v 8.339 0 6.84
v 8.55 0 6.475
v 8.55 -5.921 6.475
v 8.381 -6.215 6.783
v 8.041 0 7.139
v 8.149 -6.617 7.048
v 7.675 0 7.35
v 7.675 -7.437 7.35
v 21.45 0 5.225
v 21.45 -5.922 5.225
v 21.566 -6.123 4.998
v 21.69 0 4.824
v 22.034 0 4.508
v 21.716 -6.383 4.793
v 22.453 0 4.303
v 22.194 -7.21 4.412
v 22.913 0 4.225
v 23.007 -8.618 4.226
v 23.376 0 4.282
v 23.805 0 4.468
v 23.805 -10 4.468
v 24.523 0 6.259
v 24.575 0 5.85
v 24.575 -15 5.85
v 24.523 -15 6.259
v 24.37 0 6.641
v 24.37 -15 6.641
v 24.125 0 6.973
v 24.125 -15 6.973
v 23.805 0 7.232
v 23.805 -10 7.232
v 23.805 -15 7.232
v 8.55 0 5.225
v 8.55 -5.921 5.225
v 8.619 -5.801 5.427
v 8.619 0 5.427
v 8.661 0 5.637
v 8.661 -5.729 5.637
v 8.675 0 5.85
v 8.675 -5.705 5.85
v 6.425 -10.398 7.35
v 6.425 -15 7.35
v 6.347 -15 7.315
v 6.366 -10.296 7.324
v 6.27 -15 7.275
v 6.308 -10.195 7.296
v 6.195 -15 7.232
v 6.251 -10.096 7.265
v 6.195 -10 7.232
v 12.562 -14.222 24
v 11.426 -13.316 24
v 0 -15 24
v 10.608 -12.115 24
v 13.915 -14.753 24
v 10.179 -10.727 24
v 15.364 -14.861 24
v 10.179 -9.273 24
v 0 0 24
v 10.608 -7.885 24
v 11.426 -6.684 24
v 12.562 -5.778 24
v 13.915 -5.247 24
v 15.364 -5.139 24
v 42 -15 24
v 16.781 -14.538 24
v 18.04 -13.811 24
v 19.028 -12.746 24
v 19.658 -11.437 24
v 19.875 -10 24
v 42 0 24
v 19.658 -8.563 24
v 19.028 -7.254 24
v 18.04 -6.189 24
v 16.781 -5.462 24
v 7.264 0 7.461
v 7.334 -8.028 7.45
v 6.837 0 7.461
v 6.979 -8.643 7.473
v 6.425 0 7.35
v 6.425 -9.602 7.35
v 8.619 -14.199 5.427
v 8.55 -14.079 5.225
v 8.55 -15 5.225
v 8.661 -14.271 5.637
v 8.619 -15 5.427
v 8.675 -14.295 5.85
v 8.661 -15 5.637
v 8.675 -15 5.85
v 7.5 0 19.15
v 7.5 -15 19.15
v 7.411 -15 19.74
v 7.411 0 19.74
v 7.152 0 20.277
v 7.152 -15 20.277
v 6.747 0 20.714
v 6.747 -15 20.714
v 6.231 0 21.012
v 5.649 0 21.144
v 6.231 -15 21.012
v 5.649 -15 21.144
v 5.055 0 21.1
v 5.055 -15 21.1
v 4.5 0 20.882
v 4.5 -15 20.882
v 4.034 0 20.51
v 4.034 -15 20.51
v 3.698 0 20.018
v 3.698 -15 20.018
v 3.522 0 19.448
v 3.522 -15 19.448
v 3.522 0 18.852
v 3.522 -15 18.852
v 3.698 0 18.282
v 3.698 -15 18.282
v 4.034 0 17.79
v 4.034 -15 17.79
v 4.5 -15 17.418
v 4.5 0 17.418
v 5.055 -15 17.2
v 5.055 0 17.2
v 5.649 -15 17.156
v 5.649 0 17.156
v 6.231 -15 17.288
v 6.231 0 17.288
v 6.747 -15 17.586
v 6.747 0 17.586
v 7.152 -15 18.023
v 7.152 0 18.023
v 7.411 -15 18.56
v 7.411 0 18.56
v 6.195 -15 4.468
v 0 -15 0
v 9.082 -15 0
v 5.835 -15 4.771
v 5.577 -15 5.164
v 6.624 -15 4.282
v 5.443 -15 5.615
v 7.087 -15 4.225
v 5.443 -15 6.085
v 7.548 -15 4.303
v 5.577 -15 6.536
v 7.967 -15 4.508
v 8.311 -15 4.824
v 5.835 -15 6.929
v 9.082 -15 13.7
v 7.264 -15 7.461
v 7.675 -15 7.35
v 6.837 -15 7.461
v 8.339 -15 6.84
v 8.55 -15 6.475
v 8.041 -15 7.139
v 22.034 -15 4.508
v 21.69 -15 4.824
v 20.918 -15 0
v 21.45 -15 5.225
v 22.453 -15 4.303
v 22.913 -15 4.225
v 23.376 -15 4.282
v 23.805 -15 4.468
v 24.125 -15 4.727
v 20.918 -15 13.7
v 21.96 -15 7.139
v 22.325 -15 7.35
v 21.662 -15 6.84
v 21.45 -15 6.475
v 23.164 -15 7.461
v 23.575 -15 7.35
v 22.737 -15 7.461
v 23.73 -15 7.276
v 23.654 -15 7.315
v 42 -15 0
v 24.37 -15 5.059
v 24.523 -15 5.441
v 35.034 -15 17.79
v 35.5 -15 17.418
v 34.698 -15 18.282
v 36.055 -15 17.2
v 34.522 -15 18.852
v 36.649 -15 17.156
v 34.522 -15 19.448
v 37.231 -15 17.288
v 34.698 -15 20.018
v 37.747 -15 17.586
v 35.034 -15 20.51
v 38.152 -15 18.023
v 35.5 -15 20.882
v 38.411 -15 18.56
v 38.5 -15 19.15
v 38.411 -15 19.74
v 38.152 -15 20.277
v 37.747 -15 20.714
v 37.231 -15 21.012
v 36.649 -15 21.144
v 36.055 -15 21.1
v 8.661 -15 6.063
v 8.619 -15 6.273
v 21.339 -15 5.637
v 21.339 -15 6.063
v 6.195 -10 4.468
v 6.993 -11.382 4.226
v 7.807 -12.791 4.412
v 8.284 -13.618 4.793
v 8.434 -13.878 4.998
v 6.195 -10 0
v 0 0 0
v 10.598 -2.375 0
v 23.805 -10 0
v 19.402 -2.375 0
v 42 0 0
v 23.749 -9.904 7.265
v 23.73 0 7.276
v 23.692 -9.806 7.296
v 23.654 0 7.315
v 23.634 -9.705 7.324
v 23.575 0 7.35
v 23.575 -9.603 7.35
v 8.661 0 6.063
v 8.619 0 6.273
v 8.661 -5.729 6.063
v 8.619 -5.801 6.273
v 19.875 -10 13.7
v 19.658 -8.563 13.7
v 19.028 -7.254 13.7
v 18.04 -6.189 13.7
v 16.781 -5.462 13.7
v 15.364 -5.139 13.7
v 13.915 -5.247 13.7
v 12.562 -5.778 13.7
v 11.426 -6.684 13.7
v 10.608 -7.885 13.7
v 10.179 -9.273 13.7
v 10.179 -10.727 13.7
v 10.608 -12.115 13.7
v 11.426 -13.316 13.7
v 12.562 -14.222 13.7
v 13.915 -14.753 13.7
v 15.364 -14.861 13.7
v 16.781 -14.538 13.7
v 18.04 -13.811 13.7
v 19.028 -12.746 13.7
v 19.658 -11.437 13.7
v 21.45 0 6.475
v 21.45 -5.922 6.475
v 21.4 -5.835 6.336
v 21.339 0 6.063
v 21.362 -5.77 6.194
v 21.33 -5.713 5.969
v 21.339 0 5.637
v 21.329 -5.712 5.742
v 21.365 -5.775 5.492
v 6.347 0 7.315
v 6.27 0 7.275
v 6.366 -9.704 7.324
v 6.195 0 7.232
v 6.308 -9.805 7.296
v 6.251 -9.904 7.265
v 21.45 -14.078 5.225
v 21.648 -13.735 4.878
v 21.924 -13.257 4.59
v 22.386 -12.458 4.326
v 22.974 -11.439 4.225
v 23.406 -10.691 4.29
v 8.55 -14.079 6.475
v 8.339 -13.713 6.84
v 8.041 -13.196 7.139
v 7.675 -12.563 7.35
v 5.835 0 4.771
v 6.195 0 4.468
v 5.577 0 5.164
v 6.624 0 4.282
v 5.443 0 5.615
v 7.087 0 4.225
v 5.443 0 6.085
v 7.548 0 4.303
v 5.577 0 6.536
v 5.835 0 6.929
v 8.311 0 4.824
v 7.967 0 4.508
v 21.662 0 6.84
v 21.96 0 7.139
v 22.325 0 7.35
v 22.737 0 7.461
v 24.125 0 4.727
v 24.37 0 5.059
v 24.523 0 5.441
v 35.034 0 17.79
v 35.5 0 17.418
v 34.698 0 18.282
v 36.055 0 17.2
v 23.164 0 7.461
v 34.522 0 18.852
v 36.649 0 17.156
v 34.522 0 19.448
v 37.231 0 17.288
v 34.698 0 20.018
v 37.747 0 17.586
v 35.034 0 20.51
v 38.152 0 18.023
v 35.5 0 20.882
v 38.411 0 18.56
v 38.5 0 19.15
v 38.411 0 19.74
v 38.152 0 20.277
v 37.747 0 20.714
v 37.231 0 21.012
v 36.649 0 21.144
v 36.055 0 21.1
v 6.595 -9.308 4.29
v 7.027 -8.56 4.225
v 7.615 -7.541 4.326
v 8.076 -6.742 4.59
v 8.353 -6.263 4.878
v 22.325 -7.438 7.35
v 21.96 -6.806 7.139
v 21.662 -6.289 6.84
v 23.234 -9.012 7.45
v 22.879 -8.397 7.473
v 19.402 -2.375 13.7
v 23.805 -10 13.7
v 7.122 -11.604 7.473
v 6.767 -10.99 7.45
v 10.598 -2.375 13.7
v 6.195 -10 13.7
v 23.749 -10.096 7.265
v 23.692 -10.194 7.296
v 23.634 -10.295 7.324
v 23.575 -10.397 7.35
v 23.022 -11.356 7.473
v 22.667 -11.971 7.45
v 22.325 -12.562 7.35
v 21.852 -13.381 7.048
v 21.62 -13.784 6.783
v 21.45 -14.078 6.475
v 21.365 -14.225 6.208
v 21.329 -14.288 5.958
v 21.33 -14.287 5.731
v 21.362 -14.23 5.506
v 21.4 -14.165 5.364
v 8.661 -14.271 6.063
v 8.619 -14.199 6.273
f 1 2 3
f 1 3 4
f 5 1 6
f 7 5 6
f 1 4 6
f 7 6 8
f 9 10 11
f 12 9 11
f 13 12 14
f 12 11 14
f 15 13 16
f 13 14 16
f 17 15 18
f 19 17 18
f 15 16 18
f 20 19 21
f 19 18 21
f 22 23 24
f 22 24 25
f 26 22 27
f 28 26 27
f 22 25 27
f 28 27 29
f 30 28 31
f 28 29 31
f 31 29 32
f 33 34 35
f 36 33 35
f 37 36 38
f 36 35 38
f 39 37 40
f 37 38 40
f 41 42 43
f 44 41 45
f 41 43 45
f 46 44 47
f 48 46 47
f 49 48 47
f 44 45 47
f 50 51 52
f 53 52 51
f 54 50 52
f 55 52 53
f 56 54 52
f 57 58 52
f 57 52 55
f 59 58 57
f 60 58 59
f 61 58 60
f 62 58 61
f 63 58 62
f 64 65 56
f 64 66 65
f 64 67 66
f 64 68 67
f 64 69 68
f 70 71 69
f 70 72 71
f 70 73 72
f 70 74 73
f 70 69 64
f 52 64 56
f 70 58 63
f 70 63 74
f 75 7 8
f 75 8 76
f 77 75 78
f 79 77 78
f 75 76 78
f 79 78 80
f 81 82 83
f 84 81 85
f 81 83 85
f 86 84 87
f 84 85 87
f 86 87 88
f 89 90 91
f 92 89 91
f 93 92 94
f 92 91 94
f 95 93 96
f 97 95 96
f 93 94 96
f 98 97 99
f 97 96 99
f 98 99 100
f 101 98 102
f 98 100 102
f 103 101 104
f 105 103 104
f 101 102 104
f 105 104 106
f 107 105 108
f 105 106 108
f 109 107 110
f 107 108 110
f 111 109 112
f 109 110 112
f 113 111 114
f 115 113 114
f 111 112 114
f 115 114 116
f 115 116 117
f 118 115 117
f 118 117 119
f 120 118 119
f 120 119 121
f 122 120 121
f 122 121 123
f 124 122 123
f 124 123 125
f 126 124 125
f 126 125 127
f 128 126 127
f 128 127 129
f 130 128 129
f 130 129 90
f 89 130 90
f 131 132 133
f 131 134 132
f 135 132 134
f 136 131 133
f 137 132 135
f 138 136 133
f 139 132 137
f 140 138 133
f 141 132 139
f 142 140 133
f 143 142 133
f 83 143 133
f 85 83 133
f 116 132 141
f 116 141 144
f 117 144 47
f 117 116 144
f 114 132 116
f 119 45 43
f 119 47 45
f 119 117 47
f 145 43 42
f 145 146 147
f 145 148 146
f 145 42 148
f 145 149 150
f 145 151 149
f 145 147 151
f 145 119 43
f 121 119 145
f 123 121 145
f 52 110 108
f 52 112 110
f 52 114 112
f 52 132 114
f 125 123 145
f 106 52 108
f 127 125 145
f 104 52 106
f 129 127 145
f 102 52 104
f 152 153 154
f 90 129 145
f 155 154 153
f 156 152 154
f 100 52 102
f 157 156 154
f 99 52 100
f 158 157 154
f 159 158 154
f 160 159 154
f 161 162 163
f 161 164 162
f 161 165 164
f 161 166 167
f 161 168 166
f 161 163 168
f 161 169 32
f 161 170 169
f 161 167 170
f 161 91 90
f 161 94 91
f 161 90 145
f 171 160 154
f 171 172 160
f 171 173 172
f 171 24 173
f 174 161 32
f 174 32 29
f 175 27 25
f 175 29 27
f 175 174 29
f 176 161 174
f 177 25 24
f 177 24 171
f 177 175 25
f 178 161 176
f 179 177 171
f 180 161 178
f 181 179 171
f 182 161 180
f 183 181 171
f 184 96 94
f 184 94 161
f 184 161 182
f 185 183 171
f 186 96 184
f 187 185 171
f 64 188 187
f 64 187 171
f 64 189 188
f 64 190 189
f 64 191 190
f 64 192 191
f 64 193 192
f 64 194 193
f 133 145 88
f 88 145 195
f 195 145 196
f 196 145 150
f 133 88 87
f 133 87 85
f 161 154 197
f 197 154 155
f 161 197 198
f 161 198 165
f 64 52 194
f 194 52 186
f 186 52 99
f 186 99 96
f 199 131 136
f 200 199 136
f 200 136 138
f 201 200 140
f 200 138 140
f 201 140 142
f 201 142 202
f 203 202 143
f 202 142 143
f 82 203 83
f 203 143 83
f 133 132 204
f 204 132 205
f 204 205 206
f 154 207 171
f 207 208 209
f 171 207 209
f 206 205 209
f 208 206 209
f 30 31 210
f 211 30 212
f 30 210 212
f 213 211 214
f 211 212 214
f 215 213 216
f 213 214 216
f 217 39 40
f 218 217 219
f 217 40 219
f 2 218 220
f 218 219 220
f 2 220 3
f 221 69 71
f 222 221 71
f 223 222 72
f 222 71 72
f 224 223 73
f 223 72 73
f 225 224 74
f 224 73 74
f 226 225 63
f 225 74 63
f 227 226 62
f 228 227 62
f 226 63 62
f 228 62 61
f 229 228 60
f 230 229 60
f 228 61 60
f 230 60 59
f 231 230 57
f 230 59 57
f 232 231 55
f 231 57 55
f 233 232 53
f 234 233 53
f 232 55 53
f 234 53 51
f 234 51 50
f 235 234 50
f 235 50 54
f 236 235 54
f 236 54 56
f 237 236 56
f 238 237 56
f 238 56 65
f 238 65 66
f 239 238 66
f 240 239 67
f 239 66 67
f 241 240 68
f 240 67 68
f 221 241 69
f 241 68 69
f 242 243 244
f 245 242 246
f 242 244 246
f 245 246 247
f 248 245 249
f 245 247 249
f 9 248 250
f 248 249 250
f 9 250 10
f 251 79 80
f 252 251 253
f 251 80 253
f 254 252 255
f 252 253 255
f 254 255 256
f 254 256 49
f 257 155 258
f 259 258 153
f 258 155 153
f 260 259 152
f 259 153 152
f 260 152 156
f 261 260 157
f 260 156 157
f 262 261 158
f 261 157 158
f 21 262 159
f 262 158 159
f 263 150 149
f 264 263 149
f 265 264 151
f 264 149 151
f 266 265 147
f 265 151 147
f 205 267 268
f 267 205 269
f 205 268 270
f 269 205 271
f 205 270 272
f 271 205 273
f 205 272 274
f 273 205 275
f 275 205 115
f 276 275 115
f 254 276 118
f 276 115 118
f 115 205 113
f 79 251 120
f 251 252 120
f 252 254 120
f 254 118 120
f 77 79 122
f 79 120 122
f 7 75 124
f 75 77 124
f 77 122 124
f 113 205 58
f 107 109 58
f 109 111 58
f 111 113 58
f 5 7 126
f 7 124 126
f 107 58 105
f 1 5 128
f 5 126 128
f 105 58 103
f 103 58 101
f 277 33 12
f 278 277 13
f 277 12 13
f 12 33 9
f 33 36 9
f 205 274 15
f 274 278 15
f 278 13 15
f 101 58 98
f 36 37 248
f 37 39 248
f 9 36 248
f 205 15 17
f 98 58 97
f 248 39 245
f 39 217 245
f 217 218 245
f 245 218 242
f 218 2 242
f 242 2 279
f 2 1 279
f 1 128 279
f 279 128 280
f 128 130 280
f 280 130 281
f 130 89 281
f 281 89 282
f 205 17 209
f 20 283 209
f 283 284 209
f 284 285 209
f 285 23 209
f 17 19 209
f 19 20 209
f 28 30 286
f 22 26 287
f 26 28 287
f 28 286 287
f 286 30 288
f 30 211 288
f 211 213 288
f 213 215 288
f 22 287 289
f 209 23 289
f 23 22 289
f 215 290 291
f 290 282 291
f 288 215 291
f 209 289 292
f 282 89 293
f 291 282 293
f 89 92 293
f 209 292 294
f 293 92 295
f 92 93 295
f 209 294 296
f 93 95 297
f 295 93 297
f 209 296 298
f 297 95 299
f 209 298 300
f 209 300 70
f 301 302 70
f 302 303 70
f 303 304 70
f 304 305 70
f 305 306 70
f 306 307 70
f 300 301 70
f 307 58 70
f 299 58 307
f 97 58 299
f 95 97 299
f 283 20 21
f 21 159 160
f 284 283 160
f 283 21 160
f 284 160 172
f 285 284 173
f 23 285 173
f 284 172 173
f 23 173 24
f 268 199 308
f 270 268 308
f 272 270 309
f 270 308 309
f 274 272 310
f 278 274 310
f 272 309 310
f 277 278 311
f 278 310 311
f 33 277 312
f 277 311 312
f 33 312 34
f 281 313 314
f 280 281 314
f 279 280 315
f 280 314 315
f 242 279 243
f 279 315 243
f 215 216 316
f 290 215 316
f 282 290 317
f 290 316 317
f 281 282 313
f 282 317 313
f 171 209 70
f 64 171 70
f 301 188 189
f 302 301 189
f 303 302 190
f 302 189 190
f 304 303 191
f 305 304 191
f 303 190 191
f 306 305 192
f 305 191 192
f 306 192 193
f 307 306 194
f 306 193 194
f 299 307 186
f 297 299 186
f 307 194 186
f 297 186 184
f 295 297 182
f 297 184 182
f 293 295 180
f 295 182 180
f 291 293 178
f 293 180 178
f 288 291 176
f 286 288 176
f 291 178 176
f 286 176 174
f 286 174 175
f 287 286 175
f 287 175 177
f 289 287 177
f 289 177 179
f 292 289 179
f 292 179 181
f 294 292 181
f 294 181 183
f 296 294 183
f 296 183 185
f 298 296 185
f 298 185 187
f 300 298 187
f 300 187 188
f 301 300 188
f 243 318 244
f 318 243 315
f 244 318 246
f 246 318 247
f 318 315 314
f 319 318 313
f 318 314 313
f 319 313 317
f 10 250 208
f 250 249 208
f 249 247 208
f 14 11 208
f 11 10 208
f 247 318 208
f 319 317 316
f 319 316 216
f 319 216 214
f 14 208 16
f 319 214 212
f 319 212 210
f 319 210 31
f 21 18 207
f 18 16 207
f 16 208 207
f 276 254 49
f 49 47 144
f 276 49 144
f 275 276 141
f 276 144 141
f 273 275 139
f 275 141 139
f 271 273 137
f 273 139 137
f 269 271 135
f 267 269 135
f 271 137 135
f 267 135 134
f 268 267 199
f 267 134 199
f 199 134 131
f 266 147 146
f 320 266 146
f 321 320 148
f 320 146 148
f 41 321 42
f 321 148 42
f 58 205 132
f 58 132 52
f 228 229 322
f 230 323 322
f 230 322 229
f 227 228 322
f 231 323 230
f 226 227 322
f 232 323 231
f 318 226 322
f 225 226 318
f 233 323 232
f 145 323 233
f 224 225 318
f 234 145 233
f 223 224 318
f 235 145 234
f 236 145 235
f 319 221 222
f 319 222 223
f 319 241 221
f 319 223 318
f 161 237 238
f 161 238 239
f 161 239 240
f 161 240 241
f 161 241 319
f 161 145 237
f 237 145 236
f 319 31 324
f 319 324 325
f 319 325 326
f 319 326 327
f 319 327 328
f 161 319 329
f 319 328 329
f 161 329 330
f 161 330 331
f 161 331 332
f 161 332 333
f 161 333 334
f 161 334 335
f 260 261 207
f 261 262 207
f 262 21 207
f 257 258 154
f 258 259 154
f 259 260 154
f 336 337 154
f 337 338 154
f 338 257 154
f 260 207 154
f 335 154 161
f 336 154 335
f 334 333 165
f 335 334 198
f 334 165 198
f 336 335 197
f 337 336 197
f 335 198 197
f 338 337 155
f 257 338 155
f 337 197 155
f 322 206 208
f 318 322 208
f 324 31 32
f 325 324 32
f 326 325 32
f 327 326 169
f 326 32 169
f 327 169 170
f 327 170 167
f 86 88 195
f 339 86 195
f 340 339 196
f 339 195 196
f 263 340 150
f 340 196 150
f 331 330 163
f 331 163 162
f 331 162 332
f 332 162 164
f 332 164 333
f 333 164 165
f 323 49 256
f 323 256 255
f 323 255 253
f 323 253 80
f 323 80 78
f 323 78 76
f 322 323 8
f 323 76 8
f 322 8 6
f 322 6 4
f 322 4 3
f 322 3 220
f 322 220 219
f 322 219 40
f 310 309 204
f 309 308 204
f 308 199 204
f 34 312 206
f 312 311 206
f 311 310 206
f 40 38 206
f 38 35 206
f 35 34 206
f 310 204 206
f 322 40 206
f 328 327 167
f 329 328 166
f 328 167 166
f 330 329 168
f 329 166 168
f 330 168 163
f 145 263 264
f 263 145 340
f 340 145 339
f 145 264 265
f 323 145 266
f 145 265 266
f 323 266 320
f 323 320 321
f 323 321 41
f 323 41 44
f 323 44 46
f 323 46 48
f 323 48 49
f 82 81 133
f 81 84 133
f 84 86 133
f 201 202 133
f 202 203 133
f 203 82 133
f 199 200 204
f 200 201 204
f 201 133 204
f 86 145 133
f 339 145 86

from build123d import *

# Parameters (mm, degrees)
F0_W     = 42
F0_H     = 24
F1_DEPTH = 15
F2_R     = 2
F3_DEPTH = 25
F4_R     = 4.875
F5_DEPTH = 10.3
F6_R     = 4.875
F7_DEPTH = 13.7
F9_DEPTH = 25


with BuildPart() as f1:
    # F0 (on Front) → F1 (new body)
    with BuildSketch(Plane.XZ):
        with Locations((21, 12)):
            Rectangle(F0_W, F0_H)
    extrude(amount=F1_DEPTH)

    # F2 (on face) → F3 (cut)
    with BuildSketch(Plane.XZ.offset(15)):
        with Locations((5.5, 19.15)):
            Circle(F2_R)
        with Locations((36.5, 19.15)):
            Circle(F2_R)
    extrude(amount=-F3_DEPTH, mode=Mode.SUBTRACT)

    # F4 (on face) → F5 (cut)
    with BuildSketch(Plane.XY.offset(24)):
        with Locations((15, -10)):
            Circle(F4_R)
    extrude(amount=-F5_DEPTH, mode=Mode.SUBTRACT)

    # F6 (on face) → F7 (cut, through all)
    with BuildSketch(Plane(origin=(0, 0, 0), x_dir=(1, 0, 0), z_dir=(0, 0, -1))):
        Polygon((20.9178402592, 15), (9.0821597408, 15), (6.1954083949, 10), (10.5977041974, 2.375), (19.4022958026, 2.375), (23.8045916051, 10), align=None)
        with Locations((15, 10)):
            Circle(F6_R, mode=Mode.SUBTRACT)
        with Locations((15, 10)):
            Circle(F6_R)
    extrude(amount=-F7_DEPTH, mode=Mode.SUBTRACT)

    # F8 (on face) → F9 (cut)
    with BuildSketch(Plane.XZ.offset(15)):
        with BuildLine():
            ThreePointArc((6.1954083949, 7.2318827736), (5.4254083949, 5.85), (6.1954083949, 4.4681172264))
            Line((6.1954083949, 4.4681172264), (6.1954083949, 7.2318827736))
        make_face()
        with BuildLine():
            ThreePointArc((8.5504083949, 6.475), (8.1994569143, 6.9990485194), (7.6754083949, 7.35))
            Line((7.6754083949, 7.35), (6.4254083949, 7.35))
            ThreePointArc((6.4254083949, 7.35), (6.3080554331, 7.2955231165), (6.1954083949, 7.2318827736))
            Line((6.1954083949, 7.2318827736), (6.1954083949, 4.4681172264))
            ThreePointArc((6.1954083949, 4.4681172264), (7.5476247796, 4.3029379887), (8.5504083949, 5.225))
            Line((8.5504083949, 5.225), (8.5504083949, 6.475))
        make_face()
        with BuildLine():
            Line((6.4254083949, 7.35), (7.6754083949, 7.35))
            ThreePointArc((7.6754083949, 7.35), (7.0504083949, 7.475), (6.4254083949, 7.35))
        make_face()
        with BuildLine():
            ThreePointArc((8.6754083949, 5.85), (8.6438519929, 6.1686887196), (8.5504083949, 6.475))
            Line((8.5504083949, 6.475), (8.5504083949, 5.225))
            ThreePointArc((8.5504083949, 5.225), (8.6438519929, 5.5313112804), (8.6754083949, 5.85))
        make_face()
        with BuildLine():
            ThreePointArc((21.4504083949, 6.475), (21.3254083949, 5.85), (21.4504083949, 5.225))
            Line((21.4504083949, 5.225), (21.4504083949, 6.475))
        make_face()
        with BuildLine():
            Line((22.3254083949, 7.35), (23.5754083949, 7.35))
            ThreePointArc((23.5754083949, 7.35), (22.9504083949, 7.475), (22.3254083949, 7.35))
        make_face()
        with BuildLine():
            ThreePointArc((24.5754083949, 5.85), (24.3696815745, 6.6413840039), (23.8045916051, 7.2323878049))
            Line((23.8045916051, 7.2323878049), (23.8045916051, 4.4676121951))
            ThreePointArc((23.8045916051, 4.4676121951), (24.3696815745, 5.0586159961), (24.5754083949, 5.85))
        make_face()
        with BuildLine():
            Line((23.8045916051, 4.4676121951), (23.8045916051, 7.2323878049))
            ThreePointArc((23.8045916051, 7.2323878049), (23.6923341994, 7.2957424046), (23.5754083949, 7.35))
            Line((23.5754083949, 7.35), (22.3254083949, 7.35))
            ThreePointArc((22.3254083949, 7.35), (21.8013598754, 6.9990485194), (21.4504083949, 6.475))
            Line((21.4504083949, 6.475), (21.4504083949, 5.225))
            ThreePointArc((21.4504083949, 5.225), (22.4527349043, 4.3030849743), (23.8045916051, 4.4676121951))
        make_face()
    extrude(amount=-F9_DEPTH, mode=Mode.SUBTRACT)


solid = f1.part
